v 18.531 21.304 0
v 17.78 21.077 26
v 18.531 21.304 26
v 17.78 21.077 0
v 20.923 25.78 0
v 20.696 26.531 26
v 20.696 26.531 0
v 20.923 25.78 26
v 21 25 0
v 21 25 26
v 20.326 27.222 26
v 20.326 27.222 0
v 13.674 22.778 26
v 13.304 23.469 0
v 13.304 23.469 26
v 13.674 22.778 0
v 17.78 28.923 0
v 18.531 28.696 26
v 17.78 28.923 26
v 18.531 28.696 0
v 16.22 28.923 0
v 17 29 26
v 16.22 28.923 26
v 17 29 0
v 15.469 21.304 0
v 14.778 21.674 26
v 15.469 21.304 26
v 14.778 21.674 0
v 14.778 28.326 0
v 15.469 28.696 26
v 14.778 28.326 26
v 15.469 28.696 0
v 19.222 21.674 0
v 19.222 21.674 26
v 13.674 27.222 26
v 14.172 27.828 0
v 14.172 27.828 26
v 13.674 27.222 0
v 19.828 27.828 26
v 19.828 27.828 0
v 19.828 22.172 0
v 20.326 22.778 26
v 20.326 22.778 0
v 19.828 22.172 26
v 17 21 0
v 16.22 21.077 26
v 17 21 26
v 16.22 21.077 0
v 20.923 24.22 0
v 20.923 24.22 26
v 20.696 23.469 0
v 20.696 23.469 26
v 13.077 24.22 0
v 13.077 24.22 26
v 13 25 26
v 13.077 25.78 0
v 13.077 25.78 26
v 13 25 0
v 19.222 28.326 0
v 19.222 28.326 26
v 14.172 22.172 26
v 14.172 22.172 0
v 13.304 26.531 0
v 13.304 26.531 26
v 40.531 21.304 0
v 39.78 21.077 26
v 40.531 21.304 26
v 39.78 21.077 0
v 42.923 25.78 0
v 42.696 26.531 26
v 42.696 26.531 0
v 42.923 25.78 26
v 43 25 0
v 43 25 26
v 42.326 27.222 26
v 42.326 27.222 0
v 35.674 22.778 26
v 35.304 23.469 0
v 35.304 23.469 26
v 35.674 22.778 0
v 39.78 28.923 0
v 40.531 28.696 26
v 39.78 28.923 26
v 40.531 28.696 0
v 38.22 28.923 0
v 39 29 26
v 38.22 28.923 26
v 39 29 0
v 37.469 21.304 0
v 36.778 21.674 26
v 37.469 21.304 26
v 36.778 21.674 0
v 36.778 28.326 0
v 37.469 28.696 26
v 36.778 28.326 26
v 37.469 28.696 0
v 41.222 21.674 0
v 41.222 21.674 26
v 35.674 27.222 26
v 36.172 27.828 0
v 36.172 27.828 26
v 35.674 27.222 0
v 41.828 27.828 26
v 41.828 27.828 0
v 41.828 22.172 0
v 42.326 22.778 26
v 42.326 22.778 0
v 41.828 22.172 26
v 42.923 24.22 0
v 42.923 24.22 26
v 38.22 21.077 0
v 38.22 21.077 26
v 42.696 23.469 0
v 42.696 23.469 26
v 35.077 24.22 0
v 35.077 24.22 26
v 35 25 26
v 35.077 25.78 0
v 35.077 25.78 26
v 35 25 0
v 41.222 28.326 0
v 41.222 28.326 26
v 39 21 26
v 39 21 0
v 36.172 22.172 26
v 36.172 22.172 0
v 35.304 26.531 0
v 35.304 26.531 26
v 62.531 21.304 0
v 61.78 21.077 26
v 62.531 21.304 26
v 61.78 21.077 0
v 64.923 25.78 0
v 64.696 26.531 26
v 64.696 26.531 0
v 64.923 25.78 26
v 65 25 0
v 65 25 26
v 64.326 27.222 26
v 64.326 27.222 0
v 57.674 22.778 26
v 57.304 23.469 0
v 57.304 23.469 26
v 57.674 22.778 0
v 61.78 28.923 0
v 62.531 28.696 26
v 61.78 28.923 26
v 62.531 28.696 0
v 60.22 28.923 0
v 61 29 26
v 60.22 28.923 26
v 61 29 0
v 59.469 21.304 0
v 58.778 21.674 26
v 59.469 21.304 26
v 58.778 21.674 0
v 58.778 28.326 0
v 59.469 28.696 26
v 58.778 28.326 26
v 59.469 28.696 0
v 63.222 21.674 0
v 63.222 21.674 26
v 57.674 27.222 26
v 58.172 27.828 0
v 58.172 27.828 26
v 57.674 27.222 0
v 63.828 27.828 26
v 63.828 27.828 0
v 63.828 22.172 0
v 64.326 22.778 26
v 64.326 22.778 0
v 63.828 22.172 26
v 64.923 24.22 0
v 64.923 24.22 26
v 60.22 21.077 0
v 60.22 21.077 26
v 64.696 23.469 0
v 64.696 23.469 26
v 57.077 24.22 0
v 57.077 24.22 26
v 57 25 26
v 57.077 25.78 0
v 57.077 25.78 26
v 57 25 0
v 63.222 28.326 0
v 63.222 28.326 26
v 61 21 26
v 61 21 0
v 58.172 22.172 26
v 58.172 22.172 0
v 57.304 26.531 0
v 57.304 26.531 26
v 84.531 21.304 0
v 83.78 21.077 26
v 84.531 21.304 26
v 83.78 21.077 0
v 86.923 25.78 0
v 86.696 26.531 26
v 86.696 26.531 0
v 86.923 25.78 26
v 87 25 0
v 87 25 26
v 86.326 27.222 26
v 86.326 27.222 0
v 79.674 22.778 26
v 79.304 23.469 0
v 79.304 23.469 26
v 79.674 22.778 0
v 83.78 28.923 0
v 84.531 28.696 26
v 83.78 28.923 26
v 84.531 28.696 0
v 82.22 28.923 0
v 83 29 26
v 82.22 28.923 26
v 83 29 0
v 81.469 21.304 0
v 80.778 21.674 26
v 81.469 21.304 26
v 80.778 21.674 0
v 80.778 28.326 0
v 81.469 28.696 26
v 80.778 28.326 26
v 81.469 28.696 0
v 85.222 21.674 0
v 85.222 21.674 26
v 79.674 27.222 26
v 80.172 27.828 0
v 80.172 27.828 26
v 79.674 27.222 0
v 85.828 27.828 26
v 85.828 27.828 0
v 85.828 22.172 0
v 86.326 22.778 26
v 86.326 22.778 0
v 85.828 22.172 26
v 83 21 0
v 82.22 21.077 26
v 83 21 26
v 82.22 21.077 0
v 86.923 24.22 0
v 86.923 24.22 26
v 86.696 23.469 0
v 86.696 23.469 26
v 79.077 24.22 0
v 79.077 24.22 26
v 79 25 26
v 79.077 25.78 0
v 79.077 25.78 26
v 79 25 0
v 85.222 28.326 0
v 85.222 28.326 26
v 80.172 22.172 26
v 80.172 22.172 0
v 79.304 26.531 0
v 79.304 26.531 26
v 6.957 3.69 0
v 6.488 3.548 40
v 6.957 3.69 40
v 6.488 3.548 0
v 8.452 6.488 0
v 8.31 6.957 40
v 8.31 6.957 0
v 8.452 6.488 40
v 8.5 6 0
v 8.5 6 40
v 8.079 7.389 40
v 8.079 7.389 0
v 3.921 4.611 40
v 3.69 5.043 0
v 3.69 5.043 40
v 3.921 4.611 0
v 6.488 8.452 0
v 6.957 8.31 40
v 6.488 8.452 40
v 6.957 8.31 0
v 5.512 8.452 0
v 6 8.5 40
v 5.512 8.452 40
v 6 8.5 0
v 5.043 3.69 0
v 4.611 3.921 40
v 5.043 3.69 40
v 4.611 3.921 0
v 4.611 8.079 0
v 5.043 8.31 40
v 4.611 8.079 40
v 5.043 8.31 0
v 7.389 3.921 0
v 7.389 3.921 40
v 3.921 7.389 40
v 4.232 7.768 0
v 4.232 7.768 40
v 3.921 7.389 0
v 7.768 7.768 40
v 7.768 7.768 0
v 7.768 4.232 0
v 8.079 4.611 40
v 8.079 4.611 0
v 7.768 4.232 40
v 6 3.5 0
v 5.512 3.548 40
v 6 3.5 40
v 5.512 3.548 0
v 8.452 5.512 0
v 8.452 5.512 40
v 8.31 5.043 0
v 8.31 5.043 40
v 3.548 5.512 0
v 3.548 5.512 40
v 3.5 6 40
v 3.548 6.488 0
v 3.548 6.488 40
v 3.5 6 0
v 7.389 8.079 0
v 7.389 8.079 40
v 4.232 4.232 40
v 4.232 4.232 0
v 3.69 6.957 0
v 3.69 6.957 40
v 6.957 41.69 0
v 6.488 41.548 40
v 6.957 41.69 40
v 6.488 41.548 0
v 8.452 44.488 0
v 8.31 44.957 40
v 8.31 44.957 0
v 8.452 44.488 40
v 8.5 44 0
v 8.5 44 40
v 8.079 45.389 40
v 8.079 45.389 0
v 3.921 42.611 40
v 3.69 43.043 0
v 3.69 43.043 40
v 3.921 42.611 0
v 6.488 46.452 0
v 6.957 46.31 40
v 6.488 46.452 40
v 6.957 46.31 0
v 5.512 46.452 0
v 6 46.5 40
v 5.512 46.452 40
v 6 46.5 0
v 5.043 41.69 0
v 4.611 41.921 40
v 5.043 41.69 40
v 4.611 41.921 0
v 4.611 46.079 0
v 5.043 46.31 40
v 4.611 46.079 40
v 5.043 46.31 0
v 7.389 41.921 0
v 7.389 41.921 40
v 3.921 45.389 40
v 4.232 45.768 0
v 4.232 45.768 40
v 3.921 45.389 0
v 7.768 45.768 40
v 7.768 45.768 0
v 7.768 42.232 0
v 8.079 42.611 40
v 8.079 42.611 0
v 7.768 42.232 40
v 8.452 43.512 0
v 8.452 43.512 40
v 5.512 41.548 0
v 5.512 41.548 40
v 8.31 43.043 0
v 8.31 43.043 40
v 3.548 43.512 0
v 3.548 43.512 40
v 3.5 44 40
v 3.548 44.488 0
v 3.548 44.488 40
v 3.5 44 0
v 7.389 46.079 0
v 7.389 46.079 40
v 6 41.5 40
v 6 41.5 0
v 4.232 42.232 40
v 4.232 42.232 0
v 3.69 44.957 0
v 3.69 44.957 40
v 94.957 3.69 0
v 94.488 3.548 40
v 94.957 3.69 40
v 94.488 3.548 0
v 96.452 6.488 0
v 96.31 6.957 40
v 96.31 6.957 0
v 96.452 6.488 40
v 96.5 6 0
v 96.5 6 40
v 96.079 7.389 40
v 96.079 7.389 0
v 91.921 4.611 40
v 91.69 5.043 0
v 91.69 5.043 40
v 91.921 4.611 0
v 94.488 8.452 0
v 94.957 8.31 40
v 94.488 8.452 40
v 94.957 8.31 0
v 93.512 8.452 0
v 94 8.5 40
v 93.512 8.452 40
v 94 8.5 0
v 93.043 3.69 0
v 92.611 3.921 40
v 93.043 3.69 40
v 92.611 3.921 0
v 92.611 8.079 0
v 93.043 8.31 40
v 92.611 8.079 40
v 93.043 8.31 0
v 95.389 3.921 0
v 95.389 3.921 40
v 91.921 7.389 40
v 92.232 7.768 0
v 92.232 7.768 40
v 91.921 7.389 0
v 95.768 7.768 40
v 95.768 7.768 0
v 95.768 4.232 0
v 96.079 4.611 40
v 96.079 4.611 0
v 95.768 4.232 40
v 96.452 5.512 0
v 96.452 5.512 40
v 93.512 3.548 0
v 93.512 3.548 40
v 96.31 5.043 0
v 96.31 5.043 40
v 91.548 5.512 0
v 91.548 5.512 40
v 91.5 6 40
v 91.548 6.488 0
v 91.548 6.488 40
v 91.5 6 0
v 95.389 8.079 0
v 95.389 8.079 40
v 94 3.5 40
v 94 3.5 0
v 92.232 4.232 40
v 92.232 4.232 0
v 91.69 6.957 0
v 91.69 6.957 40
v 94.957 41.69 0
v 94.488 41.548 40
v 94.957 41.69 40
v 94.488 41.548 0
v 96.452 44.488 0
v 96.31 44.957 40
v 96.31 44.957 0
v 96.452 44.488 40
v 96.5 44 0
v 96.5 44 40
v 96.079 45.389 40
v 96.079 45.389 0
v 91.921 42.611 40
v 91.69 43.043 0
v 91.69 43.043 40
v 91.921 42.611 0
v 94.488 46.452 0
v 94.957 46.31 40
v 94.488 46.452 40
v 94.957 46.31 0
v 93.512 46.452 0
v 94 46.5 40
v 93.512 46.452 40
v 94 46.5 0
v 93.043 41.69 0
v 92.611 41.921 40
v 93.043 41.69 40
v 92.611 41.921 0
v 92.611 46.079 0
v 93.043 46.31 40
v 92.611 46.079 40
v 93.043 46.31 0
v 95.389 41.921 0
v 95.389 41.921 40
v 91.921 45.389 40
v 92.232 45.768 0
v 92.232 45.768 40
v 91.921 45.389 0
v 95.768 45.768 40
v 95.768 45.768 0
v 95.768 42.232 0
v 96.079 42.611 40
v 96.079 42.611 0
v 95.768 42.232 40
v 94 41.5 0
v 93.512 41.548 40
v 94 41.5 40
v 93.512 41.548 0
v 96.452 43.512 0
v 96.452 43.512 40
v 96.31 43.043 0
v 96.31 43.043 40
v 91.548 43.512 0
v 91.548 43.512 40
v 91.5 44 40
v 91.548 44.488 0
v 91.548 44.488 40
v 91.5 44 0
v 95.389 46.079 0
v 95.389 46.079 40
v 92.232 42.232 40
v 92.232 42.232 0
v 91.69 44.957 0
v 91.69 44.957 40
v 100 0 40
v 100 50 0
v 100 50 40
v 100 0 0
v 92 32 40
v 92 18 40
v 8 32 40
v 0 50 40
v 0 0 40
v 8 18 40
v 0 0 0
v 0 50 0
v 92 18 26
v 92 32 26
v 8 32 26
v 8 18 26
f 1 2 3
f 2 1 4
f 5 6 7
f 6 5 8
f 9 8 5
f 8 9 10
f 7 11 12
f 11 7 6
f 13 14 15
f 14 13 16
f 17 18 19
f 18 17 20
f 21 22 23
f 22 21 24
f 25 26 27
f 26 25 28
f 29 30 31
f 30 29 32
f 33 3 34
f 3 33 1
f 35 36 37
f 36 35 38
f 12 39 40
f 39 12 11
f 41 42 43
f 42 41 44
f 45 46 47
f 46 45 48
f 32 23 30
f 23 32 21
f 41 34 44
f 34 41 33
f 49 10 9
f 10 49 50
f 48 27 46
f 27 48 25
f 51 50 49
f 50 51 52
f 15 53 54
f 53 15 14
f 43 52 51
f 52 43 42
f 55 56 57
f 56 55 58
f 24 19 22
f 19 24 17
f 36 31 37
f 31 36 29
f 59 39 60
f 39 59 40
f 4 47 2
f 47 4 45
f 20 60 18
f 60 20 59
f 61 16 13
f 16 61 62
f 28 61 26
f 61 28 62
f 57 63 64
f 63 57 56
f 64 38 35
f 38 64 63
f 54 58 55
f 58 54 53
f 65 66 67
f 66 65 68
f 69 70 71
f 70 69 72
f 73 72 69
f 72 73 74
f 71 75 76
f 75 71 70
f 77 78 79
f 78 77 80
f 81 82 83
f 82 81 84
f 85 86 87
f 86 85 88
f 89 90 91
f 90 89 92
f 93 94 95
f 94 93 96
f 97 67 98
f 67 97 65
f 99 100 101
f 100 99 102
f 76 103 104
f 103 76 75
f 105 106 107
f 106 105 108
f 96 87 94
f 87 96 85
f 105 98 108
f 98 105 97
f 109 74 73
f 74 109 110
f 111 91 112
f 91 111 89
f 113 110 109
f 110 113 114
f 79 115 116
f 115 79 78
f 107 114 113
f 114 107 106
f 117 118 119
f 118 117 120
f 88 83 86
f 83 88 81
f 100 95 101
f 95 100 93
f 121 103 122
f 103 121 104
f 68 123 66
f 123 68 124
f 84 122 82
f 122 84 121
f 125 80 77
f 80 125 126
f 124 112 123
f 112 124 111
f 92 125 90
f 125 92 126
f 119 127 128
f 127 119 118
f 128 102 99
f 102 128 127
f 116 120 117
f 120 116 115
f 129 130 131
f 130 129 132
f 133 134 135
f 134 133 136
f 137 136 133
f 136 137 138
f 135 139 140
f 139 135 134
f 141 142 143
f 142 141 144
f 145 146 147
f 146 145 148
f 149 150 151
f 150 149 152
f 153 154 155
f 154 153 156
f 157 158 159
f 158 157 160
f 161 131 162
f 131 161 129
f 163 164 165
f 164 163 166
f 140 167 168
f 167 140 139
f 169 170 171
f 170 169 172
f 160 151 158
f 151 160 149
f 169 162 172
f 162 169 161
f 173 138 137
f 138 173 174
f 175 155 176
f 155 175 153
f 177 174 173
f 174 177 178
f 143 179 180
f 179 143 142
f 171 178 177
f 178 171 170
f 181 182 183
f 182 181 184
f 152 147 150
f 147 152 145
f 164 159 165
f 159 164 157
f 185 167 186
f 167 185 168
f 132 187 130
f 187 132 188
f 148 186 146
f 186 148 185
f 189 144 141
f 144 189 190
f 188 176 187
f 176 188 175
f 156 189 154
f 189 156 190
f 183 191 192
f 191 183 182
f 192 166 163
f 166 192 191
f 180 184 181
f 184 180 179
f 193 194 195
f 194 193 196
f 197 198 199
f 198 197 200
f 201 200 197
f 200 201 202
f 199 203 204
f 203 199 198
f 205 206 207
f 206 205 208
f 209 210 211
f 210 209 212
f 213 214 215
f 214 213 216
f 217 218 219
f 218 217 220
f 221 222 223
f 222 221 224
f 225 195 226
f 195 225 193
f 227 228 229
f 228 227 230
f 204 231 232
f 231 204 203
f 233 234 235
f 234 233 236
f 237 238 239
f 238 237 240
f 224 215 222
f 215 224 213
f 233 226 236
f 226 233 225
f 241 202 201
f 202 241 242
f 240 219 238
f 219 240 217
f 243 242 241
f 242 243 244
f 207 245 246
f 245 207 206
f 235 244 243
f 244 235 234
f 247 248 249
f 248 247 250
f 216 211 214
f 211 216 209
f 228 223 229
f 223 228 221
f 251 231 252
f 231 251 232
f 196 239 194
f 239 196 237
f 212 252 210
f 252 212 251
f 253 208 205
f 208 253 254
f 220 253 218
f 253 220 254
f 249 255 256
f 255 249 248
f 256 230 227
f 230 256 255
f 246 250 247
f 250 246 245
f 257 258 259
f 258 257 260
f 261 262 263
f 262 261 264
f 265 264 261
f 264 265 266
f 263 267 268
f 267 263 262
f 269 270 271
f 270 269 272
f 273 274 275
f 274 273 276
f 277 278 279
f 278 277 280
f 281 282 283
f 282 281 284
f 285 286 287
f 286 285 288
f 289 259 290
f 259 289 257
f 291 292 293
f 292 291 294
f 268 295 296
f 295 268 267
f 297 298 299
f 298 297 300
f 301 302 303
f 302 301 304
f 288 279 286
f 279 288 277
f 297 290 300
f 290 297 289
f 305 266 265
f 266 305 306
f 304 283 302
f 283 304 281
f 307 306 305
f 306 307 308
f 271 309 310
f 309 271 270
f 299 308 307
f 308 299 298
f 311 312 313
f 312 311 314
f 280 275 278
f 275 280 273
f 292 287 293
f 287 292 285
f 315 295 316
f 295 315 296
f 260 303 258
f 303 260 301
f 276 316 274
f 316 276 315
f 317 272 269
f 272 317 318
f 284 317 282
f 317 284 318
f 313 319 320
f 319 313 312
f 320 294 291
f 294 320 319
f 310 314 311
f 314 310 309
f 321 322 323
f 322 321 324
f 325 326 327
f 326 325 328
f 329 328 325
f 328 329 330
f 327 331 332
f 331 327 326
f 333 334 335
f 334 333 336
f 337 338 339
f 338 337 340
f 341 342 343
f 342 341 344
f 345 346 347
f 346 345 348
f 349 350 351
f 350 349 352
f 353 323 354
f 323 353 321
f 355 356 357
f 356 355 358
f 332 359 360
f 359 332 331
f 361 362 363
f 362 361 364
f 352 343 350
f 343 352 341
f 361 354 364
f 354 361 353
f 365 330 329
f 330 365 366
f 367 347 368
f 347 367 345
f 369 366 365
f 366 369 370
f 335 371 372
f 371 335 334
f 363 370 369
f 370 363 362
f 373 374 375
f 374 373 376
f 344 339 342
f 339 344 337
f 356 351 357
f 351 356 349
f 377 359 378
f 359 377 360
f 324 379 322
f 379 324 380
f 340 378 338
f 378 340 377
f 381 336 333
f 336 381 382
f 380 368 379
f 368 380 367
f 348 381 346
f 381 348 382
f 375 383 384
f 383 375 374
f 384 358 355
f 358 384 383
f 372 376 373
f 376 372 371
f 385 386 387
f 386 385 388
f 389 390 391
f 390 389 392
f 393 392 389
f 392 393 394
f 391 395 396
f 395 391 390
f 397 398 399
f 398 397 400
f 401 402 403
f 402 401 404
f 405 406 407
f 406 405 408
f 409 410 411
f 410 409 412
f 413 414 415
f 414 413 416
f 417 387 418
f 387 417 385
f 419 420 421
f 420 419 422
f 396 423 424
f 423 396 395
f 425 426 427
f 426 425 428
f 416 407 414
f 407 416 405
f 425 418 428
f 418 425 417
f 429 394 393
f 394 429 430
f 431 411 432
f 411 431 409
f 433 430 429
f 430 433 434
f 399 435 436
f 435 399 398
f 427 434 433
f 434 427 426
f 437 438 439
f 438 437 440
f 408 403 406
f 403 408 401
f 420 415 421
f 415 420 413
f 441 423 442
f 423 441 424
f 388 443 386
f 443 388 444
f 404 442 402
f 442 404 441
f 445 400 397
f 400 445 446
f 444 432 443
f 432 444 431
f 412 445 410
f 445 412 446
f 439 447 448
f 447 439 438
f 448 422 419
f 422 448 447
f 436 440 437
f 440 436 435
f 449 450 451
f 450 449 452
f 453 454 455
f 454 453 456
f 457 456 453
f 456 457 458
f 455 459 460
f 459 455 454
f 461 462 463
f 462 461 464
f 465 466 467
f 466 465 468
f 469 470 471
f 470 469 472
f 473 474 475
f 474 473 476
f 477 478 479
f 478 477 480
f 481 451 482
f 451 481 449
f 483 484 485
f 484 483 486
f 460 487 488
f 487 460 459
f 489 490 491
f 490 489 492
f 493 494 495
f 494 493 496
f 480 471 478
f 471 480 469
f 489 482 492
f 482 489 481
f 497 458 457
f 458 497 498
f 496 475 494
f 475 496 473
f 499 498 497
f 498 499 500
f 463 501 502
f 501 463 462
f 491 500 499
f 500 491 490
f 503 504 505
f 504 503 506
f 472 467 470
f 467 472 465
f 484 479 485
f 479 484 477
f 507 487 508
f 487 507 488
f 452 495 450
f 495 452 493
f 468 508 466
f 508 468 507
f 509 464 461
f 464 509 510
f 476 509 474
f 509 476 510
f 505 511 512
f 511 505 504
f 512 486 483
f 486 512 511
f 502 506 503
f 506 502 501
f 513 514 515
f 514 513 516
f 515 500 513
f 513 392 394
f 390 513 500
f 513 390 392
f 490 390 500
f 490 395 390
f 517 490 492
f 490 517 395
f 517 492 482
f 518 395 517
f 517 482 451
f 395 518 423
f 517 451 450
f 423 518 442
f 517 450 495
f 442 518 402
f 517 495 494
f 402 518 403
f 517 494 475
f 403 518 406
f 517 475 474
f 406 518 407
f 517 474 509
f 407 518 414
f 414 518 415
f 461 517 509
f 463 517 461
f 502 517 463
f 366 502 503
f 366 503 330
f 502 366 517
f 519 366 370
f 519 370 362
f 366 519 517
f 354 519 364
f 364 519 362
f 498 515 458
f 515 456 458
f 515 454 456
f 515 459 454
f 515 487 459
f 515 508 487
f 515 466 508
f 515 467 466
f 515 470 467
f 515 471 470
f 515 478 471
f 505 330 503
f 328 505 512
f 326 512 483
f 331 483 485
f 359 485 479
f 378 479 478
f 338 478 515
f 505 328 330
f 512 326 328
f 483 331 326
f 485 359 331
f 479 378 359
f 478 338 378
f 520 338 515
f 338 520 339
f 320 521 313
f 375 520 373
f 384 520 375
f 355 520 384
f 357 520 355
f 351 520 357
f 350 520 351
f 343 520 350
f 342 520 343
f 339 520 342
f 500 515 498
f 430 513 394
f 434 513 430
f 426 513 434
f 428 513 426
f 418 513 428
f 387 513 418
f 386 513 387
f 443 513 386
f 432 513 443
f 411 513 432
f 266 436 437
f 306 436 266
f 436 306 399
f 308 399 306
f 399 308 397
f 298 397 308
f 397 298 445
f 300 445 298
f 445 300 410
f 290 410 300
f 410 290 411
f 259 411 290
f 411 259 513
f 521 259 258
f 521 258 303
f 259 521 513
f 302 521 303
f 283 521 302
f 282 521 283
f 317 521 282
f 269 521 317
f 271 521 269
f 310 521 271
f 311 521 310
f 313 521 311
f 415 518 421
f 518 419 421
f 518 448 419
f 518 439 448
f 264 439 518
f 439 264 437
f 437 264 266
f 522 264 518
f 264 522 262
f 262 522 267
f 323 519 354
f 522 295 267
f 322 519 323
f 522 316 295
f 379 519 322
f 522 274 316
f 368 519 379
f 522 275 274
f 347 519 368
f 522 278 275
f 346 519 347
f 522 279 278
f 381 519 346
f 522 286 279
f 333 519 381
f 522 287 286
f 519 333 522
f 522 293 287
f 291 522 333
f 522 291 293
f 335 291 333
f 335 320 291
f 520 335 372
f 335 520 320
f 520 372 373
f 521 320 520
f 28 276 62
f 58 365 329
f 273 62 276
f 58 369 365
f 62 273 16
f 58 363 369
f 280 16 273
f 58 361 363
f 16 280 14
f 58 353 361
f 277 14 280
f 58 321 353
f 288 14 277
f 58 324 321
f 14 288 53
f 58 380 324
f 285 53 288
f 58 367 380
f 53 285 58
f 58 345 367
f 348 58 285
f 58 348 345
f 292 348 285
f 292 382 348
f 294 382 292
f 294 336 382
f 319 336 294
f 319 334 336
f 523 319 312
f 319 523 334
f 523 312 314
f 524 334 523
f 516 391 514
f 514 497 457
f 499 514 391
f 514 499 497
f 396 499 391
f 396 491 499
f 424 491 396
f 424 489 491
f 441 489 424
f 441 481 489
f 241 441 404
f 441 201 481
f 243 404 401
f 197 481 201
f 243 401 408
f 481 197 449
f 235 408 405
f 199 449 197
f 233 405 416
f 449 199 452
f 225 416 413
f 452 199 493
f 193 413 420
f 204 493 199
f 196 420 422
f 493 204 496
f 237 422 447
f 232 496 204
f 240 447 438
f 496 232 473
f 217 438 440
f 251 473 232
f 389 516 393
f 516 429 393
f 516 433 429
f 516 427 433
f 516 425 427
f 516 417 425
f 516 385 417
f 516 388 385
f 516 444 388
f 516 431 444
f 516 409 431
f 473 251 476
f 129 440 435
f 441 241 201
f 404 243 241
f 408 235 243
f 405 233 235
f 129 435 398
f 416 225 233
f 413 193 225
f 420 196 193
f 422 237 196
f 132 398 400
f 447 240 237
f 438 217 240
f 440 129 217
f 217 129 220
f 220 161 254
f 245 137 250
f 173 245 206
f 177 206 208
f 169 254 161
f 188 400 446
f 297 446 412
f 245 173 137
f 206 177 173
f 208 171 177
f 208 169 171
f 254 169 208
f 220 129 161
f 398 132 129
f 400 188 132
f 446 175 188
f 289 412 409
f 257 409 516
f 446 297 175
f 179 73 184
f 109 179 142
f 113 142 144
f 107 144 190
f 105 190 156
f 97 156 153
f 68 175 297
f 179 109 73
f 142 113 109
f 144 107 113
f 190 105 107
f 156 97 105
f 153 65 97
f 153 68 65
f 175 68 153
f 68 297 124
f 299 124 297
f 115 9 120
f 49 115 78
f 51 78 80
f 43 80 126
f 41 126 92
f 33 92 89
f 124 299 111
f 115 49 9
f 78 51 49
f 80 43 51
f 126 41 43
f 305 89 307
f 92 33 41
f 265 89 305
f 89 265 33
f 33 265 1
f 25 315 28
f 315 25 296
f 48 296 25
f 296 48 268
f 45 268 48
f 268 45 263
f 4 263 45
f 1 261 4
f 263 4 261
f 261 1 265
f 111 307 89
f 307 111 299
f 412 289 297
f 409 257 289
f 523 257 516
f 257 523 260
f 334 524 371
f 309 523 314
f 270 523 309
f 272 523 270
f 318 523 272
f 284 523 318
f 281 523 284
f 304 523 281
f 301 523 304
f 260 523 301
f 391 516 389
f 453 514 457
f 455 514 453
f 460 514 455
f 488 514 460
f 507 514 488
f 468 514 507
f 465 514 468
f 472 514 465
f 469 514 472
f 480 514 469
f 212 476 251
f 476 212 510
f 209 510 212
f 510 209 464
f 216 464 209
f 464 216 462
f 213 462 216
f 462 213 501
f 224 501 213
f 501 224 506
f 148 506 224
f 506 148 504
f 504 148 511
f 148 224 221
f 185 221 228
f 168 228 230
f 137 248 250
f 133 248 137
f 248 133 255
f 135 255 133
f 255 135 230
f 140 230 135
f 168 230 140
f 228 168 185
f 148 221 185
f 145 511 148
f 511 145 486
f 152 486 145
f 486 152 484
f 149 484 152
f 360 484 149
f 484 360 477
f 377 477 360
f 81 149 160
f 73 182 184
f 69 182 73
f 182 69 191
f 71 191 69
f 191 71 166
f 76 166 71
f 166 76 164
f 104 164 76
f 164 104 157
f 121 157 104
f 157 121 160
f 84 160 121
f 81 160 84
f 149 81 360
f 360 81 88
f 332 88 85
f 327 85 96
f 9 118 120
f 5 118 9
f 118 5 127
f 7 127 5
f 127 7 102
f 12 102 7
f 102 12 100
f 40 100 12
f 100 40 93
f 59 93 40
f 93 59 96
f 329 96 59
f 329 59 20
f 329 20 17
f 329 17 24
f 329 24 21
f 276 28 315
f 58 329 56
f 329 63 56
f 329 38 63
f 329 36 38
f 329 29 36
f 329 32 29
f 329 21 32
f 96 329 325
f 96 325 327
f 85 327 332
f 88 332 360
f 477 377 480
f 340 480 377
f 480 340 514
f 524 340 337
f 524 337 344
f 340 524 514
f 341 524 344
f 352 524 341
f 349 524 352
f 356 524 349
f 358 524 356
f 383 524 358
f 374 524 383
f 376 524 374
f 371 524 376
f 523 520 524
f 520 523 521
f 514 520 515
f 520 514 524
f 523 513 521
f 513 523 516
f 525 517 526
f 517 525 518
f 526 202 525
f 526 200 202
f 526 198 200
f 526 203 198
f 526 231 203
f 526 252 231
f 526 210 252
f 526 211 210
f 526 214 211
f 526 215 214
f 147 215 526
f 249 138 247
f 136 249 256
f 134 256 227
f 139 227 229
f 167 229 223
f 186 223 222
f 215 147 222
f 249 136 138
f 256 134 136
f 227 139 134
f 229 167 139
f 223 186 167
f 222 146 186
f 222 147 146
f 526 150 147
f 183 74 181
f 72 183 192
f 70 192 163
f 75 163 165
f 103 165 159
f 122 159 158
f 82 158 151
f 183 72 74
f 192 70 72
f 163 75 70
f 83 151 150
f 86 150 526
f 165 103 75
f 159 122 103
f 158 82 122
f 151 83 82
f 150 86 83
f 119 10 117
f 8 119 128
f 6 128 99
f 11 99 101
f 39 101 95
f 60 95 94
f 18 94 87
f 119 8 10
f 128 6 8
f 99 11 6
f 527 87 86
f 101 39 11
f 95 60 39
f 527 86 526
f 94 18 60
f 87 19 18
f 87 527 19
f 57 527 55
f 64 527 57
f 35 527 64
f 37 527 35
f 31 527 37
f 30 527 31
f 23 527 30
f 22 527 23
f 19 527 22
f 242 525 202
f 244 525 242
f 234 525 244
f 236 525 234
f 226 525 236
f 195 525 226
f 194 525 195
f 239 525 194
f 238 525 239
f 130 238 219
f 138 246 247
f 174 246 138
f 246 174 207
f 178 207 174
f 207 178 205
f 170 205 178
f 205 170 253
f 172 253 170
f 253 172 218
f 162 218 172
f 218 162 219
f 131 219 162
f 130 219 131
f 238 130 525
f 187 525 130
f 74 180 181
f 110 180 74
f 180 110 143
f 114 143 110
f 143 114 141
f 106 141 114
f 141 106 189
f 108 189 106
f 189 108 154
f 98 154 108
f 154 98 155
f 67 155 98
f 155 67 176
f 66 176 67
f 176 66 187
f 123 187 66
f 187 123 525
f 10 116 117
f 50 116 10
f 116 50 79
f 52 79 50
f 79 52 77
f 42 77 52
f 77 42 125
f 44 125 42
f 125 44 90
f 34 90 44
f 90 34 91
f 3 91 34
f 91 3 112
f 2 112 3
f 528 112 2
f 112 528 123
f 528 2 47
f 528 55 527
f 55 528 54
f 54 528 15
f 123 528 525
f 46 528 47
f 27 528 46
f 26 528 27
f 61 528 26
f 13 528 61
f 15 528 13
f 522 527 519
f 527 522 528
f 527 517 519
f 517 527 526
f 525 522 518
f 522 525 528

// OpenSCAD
$fn = 32;

// ----------------------------------------------------------------------
// Manifold block: gallery_top manifold
// ----------------------------------------------------------------------

// --- parameters (mm) ---
block_l = 100;            // block length, X
block_w = 50;             // block width, Y
block_h = 40;             // block height, Z
port_d = 8;               // port bore diameter
port_pitch = 22;          // port pitch along X
gallery_d = 14;           // top gallery width, Y
gallery_depth = 14;       // gallery pocket depth
wall_p = 8;               // gallery end wall thickness, X
mnt_d = 5;                // mounting hole diameter
mnt_in = 6;               // mounting hole inset from the edges

n_ports = 4;  // ports in the row
port_x0 = (block_l - (n_ports - 1) * port_pitch) / 2;  // first port X

difference() {
  cube([block_l, block_w, block_h]);
  for (i = [0 : n_ports - 1])
    translate([port_x0 + i * port_pitch, block_w / 2, -1])
      cylinder(h = block_h + 2, d = port_d);
  translate([wall_p, block_w / 2 - gallery_d / 2, block_h - gallery_depth])
    cube([block_l - 2 * wall_p, gallery_d, gallery_depth + 1]);
  for (cx = [mnt_in, block_l - mnt_in])
    for (cy = [mnt_in, block_w - mnt_in])
      translate([cx, cy, -1]) cylinder(h = block_h + 2, d = mnt_d);
}
